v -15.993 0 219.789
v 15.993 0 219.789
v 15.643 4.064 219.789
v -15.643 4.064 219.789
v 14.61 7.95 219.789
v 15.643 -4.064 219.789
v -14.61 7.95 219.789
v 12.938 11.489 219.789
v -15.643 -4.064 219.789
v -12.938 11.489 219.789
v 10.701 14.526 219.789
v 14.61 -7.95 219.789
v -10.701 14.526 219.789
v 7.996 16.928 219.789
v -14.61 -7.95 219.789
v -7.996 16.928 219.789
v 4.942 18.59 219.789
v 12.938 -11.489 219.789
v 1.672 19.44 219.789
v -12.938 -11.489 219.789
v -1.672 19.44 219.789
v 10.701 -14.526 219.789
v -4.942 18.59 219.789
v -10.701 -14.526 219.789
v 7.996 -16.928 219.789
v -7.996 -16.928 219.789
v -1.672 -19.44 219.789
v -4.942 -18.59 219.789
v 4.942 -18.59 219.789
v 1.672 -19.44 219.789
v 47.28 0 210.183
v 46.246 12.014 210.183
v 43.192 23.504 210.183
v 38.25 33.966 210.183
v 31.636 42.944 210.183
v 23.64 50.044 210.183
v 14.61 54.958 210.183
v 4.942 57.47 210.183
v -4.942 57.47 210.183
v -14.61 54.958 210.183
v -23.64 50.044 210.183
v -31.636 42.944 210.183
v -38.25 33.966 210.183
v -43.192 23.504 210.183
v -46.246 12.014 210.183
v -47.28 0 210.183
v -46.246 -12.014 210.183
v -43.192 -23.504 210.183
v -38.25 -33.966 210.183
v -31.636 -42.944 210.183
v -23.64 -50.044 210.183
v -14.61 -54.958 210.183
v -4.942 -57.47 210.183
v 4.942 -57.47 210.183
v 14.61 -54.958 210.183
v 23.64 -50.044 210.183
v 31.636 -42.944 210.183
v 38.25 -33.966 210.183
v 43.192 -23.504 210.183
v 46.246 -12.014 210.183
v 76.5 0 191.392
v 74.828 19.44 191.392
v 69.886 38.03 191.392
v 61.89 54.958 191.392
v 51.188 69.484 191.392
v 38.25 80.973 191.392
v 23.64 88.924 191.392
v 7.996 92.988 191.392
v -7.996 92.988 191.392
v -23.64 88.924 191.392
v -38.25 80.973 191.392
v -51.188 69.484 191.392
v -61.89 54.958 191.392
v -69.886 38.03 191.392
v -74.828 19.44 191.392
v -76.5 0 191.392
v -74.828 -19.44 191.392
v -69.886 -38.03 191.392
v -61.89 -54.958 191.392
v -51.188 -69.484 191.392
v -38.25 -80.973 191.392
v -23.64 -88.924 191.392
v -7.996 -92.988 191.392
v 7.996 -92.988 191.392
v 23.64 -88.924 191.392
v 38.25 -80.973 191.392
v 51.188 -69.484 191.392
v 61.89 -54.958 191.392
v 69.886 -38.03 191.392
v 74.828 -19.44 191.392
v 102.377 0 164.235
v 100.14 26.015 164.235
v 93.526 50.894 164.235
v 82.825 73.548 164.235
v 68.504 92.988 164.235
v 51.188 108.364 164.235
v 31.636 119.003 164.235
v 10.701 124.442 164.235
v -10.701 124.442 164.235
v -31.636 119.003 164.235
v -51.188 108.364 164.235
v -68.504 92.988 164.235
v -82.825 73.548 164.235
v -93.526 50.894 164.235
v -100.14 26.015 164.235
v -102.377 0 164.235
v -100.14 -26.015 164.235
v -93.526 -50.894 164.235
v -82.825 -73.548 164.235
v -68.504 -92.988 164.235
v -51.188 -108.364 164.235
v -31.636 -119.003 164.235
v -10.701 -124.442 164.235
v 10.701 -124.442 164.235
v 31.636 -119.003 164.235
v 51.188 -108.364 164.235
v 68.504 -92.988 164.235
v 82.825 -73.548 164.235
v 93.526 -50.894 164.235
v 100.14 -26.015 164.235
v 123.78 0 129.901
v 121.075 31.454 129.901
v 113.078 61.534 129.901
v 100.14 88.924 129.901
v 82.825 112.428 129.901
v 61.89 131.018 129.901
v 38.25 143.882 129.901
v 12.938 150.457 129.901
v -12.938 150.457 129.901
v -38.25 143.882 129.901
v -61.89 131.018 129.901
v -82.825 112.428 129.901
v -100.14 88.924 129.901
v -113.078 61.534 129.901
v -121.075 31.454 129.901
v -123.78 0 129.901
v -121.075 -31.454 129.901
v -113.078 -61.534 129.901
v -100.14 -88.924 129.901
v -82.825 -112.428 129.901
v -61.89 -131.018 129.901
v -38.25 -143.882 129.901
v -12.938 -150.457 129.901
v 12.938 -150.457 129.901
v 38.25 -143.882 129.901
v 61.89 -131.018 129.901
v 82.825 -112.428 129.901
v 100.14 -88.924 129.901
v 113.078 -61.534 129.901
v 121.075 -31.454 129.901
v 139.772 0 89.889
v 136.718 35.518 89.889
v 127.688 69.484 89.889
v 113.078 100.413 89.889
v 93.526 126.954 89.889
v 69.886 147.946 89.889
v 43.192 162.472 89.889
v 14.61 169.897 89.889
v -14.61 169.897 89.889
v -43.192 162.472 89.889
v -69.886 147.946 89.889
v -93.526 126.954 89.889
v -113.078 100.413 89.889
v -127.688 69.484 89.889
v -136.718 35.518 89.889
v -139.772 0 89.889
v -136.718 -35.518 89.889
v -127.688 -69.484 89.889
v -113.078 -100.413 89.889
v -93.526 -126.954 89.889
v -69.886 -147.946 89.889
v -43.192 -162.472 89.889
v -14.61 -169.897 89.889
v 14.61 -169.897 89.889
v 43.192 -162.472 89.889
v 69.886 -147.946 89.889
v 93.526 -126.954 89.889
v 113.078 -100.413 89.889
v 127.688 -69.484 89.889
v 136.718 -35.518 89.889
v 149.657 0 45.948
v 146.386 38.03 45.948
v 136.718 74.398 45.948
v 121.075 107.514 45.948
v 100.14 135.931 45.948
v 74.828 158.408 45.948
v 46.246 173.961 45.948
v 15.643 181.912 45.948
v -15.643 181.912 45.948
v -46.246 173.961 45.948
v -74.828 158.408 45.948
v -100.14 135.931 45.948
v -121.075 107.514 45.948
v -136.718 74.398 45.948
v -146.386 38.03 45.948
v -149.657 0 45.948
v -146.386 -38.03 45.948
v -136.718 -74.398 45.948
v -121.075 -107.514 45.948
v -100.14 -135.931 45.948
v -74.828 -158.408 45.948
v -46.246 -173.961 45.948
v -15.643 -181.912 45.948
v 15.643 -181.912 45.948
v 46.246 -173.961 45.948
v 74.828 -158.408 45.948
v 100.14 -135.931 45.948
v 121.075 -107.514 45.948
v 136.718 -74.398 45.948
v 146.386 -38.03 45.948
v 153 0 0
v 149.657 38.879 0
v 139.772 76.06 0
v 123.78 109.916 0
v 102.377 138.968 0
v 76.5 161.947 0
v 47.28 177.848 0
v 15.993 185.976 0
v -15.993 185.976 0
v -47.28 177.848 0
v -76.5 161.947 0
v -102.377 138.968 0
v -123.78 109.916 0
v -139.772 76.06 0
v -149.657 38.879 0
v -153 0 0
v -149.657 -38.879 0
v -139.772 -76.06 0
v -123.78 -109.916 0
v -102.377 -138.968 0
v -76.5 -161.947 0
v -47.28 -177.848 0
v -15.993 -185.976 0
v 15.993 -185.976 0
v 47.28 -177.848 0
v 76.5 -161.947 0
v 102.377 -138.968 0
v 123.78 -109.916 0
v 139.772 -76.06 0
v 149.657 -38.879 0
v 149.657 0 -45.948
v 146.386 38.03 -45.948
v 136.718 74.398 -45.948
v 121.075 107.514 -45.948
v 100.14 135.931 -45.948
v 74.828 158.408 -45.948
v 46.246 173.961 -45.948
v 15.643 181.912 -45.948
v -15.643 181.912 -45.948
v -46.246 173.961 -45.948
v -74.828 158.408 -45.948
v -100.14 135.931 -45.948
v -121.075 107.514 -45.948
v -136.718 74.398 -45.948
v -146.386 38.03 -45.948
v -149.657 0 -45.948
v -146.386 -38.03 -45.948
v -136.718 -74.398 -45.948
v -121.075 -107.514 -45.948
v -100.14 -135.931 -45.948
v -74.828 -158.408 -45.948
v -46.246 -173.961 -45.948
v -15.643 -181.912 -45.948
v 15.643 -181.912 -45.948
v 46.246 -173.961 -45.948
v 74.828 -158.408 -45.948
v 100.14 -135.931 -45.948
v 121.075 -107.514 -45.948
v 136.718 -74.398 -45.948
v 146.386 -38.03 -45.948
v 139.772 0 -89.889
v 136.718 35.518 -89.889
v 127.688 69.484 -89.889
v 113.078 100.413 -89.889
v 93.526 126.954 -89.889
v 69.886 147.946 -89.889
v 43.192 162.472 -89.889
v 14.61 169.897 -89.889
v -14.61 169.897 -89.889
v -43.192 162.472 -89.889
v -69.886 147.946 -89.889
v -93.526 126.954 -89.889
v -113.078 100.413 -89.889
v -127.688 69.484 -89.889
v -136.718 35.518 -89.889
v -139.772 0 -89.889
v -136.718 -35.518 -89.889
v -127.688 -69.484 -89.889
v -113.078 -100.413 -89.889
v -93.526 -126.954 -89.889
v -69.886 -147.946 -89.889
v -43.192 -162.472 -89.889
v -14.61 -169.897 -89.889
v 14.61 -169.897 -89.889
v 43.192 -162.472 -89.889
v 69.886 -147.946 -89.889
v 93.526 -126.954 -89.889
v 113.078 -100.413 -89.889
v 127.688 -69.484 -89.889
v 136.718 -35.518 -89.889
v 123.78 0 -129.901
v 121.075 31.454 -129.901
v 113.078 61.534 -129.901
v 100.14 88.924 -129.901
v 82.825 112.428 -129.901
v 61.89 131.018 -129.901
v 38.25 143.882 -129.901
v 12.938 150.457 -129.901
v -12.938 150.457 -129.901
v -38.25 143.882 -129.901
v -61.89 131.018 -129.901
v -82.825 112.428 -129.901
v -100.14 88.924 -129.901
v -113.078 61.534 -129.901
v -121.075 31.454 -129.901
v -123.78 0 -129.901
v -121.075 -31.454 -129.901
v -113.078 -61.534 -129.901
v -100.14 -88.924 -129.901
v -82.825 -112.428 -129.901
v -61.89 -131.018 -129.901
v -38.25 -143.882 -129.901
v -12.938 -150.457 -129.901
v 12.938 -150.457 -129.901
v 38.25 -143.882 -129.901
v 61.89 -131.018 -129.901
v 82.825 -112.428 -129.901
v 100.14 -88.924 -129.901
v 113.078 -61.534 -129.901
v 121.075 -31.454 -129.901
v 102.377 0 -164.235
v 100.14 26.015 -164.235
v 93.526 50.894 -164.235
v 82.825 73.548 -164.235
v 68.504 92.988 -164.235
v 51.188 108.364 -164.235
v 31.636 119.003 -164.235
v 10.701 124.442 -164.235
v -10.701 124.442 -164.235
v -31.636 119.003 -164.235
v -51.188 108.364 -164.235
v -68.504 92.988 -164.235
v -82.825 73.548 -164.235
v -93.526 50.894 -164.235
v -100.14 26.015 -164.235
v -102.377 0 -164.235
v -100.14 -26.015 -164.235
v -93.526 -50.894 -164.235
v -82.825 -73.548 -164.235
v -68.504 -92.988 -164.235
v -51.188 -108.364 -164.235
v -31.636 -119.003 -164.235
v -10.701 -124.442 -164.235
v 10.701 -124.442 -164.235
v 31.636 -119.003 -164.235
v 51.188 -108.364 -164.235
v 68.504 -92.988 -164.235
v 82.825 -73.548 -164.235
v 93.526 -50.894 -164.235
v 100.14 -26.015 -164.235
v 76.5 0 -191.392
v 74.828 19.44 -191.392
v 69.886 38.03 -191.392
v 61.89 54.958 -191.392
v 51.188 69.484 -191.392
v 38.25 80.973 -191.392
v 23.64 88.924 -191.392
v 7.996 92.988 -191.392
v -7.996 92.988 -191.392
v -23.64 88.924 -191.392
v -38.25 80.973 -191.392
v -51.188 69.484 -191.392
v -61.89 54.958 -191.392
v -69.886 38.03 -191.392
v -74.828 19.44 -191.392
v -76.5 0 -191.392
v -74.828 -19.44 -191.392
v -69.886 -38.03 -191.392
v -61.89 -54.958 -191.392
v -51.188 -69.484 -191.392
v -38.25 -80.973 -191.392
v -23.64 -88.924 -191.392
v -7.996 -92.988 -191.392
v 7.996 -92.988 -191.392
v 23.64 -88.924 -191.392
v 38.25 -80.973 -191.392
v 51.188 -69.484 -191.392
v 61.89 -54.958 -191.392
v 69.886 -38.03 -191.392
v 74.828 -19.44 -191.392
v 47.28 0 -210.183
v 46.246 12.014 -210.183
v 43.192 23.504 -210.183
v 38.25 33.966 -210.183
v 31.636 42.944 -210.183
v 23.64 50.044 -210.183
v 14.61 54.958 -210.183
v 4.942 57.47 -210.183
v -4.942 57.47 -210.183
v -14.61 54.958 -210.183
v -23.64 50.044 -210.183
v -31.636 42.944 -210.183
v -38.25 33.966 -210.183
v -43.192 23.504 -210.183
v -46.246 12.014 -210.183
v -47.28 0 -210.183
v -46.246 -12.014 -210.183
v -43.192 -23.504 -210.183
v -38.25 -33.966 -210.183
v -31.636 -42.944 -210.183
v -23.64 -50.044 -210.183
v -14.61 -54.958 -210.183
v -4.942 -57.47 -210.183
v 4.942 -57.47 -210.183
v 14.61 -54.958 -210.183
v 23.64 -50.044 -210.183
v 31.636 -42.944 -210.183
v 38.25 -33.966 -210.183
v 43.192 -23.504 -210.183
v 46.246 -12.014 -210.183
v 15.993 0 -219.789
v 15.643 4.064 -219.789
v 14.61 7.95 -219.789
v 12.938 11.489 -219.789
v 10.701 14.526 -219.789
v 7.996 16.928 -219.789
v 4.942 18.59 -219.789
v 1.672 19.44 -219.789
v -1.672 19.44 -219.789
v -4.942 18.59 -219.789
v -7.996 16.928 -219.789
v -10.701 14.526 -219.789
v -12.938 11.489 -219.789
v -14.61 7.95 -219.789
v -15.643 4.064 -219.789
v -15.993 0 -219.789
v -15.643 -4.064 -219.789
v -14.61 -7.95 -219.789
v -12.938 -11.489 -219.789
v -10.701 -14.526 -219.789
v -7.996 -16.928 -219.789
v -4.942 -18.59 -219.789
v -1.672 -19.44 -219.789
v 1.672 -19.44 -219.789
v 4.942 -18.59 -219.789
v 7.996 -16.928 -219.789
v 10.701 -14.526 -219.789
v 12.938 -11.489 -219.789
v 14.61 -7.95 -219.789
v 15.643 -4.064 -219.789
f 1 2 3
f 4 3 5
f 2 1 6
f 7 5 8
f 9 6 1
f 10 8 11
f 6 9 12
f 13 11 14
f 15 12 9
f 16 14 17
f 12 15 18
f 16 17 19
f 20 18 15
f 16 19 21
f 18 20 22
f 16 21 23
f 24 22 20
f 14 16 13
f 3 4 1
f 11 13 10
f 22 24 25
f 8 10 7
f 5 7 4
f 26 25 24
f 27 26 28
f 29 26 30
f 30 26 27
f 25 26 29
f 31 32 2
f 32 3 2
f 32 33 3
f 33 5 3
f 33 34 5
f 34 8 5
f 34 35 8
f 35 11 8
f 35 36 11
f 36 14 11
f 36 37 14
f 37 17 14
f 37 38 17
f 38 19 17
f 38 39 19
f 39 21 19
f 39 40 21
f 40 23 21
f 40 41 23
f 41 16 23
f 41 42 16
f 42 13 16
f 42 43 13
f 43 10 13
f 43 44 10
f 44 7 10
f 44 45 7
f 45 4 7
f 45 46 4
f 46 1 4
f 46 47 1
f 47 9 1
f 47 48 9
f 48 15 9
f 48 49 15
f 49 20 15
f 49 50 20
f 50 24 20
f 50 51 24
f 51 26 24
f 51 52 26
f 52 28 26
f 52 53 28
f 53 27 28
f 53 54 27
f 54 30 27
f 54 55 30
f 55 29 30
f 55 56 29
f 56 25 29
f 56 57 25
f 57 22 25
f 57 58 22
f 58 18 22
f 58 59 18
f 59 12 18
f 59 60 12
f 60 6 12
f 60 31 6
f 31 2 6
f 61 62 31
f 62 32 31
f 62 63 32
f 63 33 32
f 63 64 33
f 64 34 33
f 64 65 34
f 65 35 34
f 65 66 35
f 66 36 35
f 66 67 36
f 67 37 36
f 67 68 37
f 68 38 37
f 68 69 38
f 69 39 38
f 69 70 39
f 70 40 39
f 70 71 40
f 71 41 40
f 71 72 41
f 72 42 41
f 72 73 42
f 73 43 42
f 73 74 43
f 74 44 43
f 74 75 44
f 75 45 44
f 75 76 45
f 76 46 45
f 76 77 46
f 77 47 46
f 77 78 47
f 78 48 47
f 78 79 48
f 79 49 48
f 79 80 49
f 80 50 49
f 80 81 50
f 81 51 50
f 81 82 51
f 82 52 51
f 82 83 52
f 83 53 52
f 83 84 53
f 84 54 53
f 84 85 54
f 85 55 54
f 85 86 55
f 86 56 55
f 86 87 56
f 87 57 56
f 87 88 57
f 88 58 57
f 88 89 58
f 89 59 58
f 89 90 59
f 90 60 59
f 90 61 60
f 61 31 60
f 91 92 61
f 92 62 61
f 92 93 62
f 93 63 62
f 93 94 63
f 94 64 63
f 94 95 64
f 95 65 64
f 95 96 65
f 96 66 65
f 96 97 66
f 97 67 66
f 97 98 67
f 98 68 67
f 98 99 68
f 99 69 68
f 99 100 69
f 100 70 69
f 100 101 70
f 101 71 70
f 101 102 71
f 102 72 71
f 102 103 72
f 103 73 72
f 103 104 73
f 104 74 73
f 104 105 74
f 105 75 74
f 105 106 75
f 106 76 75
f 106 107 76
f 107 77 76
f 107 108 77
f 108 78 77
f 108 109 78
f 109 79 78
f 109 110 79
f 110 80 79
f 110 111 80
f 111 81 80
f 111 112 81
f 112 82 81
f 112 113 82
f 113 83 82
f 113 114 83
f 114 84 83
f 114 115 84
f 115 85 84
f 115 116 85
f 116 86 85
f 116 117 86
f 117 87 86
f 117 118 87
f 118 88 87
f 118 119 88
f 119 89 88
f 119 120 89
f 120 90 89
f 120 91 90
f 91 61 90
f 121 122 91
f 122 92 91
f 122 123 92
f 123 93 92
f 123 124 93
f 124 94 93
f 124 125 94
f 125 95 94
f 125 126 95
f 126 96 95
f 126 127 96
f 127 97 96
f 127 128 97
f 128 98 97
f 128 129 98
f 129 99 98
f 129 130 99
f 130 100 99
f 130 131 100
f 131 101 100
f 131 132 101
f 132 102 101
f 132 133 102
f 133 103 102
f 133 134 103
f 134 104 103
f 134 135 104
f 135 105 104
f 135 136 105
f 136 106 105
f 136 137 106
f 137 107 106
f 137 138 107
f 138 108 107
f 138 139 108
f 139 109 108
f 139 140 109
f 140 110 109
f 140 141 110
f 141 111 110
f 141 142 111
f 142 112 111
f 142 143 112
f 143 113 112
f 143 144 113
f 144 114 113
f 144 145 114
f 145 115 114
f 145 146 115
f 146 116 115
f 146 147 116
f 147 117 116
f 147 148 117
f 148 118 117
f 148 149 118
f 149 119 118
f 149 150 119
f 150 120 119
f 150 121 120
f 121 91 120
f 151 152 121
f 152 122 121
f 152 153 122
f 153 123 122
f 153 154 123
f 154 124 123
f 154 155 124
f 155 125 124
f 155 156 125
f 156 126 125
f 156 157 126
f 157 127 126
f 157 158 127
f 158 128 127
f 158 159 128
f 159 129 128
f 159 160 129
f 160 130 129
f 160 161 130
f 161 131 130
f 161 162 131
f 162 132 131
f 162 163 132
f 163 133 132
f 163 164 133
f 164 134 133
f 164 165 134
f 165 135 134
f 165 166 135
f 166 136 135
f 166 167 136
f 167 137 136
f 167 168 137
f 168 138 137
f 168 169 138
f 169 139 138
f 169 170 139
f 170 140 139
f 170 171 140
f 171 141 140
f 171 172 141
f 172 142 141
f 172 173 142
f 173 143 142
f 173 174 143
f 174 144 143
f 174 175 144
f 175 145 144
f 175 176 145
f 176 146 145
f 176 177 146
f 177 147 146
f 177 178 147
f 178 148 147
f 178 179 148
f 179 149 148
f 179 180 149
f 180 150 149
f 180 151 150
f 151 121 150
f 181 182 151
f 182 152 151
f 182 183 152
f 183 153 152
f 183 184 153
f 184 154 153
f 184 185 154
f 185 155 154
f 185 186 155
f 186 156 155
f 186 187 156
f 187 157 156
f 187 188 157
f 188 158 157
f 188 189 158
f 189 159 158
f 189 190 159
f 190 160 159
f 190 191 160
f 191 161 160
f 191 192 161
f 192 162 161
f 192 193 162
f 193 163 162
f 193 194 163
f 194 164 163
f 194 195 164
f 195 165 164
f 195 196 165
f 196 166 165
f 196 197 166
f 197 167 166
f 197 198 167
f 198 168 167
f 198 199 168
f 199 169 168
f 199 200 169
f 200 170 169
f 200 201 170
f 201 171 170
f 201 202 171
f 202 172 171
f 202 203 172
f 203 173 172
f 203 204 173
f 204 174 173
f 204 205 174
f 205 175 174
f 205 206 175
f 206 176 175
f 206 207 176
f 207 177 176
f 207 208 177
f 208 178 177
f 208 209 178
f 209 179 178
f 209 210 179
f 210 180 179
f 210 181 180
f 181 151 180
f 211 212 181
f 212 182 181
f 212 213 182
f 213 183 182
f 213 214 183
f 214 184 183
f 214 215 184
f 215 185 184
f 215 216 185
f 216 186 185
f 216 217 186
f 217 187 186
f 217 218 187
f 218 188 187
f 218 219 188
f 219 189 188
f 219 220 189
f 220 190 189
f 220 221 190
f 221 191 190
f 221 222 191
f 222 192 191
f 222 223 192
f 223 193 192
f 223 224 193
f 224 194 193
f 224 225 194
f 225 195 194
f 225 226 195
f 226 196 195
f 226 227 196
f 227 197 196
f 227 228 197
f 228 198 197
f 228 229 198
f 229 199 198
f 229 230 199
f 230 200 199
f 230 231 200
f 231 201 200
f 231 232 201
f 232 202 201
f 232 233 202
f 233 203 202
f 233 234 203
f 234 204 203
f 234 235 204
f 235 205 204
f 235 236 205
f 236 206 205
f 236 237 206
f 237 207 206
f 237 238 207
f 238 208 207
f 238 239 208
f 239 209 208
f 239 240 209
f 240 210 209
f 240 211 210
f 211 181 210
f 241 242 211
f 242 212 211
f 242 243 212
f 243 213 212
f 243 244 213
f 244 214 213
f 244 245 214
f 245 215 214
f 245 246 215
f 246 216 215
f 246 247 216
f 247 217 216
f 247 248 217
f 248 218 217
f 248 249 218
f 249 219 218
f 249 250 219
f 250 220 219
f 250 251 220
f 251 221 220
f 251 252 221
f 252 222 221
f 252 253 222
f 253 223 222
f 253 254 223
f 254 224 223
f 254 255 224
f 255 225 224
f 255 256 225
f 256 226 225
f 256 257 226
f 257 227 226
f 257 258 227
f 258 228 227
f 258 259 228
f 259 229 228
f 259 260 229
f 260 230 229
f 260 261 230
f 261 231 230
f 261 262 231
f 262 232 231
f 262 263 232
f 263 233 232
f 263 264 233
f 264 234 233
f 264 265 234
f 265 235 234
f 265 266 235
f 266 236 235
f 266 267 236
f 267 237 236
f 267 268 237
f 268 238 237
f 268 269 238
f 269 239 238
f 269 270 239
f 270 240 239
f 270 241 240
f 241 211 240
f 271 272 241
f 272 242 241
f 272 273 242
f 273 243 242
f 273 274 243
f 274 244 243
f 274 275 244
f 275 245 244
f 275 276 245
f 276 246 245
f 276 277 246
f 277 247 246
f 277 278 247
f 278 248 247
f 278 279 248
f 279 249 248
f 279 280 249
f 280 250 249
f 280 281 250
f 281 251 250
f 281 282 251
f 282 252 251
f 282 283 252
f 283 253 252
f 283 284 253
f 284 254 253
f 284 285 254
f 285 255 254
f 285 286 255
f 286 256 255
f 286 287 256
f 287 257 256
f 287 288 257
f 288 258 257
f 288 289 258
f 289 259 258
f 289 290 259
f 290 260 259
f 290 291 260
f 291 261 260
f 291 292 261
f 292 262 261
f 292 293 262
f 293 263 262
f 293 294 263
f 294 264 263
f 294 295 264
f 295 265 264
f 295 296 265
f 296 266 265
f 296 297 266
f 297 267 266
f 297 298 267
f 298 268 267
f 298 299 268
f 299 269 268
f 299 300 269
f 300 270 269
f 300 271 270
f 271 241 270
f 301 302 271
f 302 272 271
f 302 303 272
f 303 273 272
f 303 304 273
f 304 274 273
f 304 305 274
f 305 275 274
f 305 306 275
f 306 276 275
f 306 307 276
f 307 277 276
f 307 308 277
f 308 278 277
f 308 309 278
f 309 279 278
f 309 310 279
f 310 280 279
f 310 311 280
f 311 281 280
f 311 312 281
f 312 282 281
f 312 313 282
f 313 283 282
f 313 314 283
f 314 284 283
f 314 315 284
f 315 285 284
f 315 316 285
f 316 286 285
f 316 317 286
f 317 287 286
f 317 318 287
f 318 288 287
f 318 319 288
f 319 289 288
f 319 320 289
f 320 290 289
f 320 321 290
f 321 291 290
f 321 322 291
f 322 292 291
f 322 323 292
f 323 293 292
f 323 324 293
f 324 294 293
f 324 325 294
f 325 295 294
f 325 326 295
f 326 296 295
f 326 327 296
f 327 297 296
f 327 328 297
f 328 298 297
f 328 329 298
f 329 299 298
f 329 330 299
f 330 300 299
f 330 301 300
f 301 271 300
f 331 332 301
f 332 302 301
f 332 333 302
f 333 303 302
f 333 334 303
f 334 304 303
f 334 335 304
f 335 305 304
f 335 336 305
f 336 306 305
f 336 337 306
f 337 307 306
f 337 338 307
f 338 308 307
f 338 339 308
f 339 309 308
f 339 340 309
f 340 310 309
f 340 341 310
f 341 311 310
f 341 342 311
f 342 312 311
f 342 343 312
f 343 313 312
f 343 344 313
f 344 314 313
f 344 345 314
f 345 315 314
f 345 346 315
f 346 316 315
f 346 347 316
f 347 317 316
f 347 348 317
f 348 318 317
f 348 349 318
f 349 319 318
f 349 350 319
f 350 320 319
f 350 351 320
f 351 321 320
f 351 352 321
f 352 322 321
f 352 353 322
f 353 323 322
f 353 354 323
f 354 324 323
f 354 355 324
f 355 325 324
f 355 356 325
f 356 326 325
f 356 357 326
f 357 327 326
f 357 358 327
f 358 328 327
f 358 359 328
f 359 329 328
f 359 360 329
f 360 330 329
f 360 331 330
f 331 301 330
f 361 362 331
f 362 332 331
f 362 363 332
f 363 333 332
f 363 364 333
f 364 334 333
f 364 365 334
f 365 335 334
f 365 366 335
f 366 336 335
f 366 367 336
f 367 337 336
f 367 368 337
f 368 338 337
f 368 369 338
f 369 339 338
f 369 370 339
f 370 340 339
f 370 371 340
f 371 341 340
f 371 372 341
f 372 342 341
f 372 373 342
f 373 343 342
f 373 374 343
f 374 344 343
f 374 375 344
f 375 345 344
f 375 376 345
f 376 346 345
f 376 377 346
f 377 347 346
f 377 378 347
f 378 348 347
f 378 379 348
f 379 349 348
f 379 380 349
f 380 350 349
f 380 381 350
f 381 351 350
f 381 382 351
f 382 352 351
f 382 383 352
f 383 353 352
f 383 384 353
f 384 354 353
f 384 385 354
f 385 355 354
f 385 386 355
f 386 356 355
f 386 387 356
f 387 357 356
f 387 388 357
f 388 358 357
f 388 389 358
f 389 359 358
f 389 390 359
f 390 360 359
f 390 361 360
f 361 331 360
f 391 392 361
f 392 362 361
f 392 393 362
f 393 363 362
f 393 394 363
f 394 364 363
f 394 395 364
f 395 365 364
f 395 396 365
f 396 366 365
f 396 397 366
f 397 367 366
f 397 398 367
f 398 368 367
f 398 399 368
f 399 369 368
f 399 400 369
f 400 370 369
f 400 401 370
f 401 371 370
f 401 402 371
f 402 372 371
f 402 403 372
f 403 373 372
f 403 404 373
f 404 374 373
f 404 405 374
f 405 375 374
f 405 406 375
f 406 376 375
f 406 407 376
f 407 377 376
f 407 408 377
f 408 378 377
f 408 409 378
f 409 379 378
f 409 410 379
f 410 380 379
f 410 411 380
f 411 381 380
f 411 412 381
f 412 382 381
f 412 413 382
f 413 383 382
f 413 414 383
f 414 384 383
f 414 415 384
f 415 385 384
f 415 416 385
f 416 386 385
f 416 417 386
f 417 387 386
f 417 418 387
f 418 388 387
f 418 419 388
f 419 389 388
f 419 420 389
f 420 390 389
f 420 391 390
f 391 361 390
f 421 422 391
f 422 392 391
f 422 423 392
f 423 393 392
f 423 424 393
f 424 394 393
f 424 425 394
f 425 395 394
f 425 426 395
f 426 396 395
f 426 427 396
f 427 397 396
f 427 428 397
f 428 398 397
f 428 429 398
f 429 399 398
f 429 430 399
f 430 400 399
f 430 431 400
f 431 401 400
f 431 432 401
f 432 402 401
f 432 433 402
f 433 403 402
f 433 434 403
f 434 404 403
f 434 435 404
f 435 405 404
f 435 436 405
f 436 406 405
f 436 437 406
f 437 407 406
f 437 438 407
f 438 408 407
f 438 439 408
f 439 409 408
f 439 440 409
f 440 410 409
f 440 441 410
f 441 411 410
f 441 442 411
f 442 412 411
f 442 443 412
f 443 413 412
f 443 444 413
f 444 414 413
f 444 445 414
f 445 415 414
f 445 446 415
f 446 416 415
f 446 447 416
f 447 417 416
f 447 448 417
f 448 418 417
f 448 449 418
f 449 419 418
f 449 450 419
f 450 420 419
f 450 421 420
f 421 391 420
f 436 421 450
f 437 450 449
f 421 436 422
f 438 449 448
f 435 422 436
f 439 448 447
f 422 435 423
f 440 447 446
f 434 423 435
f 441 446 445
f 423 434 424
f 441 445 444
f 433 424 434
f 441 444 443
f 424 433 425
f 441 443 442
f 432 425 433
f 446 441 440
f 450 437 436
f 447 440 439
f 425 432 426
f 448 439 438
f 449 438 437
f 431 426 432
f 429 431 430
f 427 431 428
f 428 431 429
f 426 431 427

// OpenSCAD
// Generated by SolidPython 1.0.1 on 2020-07-29 00:46:48


scale(v = [9, 11, 13]) {
	sphere(r = 17);
}
/***********************************************
*********      SolidPython code:      **********
************************************************
 
# import packages: SolidPython
from solid import *
from solid.utils import *
from itertools import chain, combinations, permutations


class Resize:

    def __init__(self, scad_file):
        self.scad_file = scad_file
        #self.scad_file = import_scad(scad_file)
        # cone/cylinder param:
        self.r1 = 0
        self.r2 = 0
        self.h = 0
        # rectangular prism param:
        self.w = 0
        self.l = 0
        # ellipse param:
        self.r = 0

    # import OpenScad code (file name corresponds to shape)


    # classify shape + parameters
    def assign(self, param1, param2, param3):
        if self.scad_file == 'cone.scad':
            self.r1 = param1
            self.r2 = param2
            self.h = param3
        elif self.scad_file == 'cylinder.scad':
            self.r1 = param1
            self.r2 = param2
            self.h = param3
        elif self.scad_file == 'rectangularPrism.scad':
            self.h = param1
            self.l = param2
            self.w = param3
        else:
            self.r = param1
            self.h = param2

    # resize parameters
    def iterate(self):
        x = range(3, 20, 2)
        i = 1
        if self.scad_file == 'cone.scad':
            tempList = list(permutations(x, 2))
            for temp in tempList:
                param1 = temp[0]
                param2 = temp[1]
                filepath = 'produced_scad_files/' + 'cone' + str(param1) + '_' + str(param2) + '_' + '.scad'
                scad_render_to_file(cylinder(h=param1, r1=param2, r2=0), filepath)

        elif self.scad_file == 'cylinder.scad':
            tempList = list(permutations(x, 3))
            for temp in tempList:
                param1 = temp[0]
                param2 = temp[1]
                filepath = 'produced_scad_files/' + 'cylinder' + str(param1) + '_' + str(param2) + '_' + '.scad'
                scad_render_to_file(cylinder(h=param1, r1=param2, r2=param2), filepath)

        elif self.scad_file == 'rectangularPrism.scad':
            tempList = list(permutations(x, 3))
            for temp in tempList:
                param1 = temp[0]
                param2 = temp[1]
                param3 = temp[2]
                filepath = 'produced_scad_files/' + 'rectangularPrism' + str(param1) + '_' + str(param2) + '_' + str(
                    param3) + '.scad'
                scad_render_to_file(cube(size=(param1, param2, param3)), filepath)

        elif self.scad_file == 'ellipse.scad':
            tempList = list(permutations(x, 4))
            for temp in tempList:
                param1 = temp[0]
                param2 = temp[1]
                param3 = temp[2]
                param4 = temp[3]
                filepath = 'produced_scad_files/' + 'ellipse' + str(param1) + '_' + str(param2) + '_' + str(param3) + '_' + str(param4) + '.scad'
                scad_render_to_file(scale([param1, param2, param3])(sphere(r=param4)), filepath)

    def render_to_scadfile(self):
        scad_render_to_file(scad, 'example.scad') 
 
************************************************/
